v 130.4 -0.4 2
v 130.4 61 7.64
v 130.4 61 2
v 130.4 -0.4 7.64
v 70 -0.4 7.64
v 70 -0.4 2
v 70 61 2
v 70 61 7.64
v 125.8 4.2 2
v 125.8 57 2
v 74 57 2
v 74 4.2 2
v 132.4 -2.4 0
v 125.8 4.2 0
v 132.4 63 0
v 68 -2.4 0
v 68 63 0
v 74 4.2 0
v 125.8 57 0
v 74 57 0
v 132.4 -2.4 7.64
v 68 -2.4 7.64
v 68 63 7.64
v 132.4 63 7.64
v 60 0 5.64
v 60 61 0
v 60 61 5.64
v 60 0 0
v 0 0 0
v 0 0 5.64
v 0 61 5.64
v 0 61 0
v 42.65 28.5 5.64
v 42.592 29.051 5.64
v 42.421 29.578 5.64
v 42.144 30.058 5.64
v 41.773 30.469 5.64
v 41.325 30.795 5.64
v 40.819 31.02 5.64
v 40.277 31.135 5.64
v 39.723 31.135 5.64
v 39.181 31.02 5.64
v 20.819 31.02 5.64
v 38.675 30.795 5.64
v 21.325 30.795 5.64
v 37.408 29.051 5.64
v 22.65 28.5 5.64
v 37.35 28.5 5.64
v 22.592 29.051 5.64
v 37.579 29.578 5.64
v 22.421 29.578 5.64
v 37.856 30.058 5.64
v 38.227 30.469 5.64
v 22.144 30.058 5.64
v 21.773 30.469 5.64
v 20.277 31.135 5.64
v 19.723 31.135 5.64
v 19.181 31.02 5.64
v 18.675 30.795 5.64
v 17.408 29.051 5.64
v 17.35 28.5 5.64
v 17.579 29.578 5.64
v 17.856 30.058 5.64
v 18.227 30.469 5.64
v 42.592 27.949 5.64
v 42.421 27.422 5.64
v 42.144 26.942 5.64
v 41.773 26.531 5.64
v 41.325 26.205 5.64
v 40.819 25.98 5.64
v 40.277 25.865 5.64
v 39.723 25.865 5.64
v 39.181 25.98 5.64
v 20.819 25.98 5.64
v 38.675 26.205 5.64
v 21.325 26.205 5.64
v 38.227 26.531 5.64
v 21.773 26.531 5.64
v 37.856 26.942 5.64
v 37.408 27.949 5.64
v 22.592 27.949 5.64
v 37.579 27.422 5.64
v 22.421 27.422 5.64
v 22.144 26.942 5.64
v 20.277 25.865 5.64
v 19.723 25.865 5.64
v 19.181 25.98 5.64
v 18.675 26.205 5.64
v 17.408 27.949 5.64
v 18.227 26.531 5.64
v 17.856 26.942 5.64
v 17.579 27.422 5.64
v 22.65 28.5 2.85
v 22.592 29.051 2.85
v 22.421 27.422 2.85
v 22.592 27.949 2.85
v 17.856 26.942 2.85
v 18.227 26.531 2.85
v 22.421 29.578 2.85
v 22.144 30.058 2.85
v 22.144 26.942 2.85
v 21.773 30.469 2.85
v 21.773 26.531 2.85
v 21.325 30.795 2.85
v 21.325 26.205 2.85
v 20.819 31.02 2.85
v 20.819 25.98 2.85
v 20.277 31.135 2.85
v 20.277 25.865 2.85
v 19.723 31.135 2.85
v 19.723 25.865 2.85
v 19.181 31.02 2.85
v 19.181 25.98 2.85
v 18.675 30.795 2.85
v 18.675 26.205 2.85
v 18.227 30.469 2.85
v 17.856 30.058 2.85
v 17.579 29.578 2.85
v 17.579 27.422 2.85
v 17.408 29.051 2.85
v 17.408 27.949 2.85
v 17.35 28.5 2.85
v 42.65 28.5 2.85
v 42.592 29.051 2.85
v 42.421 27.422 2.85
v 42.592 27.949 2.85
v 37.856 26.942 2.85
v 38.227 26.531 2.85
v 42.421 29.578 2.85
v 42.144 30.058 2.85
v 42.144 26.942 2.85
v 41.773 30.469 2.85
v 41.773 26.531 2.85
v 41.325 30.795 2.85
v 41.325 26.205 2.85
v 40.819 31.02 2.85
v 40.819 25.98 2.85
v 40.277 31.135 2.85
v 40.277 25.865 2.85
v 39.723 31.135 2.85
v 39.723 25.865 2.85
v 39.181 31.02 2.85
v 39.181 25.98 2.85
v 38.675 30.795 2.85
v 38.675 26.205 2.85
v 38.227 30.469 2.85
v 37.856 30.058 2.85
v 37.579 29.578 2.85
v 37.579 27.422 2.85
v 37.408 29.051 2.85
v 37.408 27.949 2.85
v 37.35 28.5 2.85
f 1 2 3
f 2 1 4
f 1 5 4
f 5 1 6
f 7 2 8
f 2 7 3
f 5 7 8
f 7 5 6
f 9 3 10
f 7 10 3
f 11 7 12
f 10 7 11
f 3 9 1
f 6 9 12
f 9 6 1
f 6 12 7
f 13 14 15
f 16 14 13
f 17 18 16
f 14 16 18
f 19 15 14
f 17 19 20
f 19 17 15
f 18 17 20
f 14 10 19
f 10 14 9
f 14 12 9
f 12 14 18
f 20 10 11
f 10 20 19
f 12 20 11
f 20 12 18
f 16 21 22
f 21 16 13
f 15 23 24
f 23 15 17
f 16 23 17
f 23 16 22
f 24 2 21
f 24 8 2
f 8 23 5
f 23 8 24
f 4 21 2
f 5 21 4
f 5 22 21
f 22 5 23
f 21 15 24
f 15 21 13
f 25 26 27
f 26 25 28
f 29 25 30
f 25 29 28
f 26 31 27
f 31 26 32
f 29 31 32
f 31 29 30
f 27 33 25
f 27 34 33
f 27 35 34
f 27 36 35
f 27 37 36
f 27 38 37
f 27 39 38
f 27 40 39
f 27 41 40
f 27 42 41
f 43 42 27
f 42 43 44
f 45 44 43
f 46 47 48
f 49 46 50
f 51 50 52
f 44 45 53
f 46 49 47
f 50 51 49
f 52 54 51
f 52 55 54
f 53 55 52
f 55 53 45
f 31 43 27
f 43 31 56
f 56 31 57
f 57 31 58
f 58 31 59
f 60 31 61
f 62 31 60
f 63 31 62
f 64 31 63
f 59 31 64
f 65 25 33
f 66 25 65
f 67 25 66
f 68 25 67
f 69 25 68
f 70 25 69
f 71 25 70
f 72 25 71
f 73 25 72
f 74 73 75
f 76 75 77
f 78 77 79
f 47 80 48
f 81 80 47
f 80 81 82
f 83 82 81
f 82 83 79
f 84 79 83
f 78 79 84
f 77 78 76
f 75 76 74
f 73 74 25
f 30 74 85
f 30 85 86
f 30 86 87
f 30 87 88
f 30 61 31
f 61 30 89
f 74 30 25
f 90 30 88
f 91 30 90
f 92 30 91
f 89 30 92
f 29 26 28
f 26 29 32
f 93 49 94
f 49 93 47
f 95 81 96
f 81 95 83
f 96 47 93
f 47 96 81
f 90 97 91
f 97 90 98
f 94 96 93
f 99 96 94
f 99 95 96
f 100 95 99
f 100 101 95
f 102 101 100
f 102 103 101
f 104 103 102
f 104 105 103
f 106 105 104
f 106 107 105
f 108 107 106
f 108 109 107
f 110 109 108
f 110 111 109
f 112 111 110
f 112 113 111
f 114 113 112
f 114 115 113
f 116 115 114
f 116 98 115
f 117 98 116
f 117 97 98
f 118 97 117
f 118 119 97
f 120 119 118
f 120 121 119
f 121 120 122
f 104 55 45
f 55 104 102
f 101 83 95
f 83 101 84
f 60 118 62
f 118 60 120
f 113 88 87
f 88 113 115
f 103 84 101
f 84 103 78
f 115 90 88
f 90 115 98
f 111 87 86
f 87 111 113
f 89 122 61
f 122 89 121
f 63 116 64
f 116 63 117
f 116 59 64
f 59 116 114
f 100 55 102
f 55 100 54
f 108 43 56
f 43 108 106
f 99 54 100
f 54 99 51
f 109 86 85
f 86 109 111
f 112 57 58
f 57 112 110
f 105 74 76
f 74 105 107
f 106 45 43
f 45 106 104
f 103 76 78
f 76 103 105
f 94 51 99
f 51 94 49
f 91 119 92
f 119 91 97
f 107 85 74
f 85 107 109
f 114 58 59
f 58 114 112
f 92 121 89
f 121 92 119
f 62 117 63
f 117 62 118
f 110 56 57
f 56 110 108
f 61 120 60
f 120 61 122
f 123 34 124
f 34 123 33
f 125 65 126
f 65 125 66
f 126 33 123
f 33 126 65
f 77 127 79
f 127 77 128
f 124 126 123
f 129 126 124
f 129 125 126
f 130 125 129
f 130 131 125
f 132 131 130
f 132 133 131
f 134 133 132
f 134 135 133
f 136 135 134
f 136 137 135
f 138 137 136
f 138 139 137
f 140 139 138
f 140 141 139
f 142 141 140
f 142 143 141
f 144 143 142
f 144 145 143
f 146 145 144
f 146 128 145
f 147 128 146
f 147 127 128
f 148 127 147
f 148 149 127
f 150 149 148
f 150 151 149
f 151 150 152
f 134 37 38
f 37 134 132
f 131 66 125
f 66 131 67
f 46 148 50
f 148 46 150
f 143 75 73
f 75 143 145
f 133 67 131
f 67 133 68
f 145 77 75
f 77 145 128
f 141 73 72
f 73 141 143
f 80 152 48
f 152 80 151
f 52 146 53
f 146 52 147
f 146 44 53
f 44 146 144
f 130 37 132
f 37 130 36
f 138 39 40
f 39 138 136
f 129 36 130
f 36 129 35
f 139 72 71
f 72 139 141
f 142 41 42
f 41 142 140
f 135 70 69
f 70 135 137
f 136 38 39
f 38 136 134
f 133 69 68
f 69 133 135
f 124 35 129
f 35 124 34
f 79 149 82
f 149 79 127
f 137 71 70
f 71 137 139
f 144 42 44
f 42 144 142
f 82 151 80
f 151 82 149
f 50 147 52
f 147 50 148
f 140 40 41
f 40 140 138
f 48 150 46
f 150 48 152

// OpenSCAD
$fs = .4;

front_depth = 2;
back_depth = 5.64;

picture_thickness = .1;
clearance = .2;
tab_padding = 2.5;

picture_width = 60;
picture_height = 61;

module front(picture_width, picture_height, border = 4) {
    translate([-front_depth, 0, -front_depth])
        cube([front_depth, front_depth+back_depth, picture_height + 2*clearance + 2*front_depth]);
    translate([picture_width+clearance*2, 0, -front_depth])
        cube([front_depth, front_depth+back_depth, picture_height + 2*clearance + 2*front_depth]);
    translate([0, 0, -front_depth])
        cube([picture_width+clearance*2, front_depth+back_depth, front_depth]);
    translate([0, 0, picture_height+clearance*2])
        cube([picture_width + 2*clearance, front_depth+back_depth, front_depth]);
    difference() {
        cube([picture_width+clearance*2, front_depth, picture_height+clearance*2]);
        translate([border, -.01, border])
            cube([picture_width - border*2-clearance, front_depth+.02, picture_height - border*2-clearance]);
    }
}


back_border = 2;

module back(picture_width, picture_height) {

    module magnet_hole() {
        rotate([90, 0, 0]) 
        cylinder(h = 2.8, d = 5.3, center = false);
    }
    difference() {
        cube([picture_width, back_depth, picture_height]);
        
        /*translate([picture_width/7, -.01, picture_height/8])
            cube([picture_width/7*5, back_depth+.02, picture_height/4]);
        translate([picture_width/7, -.01, picture_height/1.6])
            cube([picture_width/7*5, back_depth+.02, picture_height/4]);*/

        translate([picture_width/3, back_depth+.01, picture_height/2+back_border])
            magnet_hole();
        translate([picture_width/3*2, back_depth+.01, picture_height/2+back_border])
            magnet_hole();
    }
}

//back(picture_width, picture_height);


//front(picture_width, picture_height);


translate([picture_width + 10, picture_height, 0]) rotate([90,0,0]) color("red", 1) front(picture_width, picture_height);
translate([0, picture_height, 0]) rotate([90,0,0]) back(picture_width, picture_height);
